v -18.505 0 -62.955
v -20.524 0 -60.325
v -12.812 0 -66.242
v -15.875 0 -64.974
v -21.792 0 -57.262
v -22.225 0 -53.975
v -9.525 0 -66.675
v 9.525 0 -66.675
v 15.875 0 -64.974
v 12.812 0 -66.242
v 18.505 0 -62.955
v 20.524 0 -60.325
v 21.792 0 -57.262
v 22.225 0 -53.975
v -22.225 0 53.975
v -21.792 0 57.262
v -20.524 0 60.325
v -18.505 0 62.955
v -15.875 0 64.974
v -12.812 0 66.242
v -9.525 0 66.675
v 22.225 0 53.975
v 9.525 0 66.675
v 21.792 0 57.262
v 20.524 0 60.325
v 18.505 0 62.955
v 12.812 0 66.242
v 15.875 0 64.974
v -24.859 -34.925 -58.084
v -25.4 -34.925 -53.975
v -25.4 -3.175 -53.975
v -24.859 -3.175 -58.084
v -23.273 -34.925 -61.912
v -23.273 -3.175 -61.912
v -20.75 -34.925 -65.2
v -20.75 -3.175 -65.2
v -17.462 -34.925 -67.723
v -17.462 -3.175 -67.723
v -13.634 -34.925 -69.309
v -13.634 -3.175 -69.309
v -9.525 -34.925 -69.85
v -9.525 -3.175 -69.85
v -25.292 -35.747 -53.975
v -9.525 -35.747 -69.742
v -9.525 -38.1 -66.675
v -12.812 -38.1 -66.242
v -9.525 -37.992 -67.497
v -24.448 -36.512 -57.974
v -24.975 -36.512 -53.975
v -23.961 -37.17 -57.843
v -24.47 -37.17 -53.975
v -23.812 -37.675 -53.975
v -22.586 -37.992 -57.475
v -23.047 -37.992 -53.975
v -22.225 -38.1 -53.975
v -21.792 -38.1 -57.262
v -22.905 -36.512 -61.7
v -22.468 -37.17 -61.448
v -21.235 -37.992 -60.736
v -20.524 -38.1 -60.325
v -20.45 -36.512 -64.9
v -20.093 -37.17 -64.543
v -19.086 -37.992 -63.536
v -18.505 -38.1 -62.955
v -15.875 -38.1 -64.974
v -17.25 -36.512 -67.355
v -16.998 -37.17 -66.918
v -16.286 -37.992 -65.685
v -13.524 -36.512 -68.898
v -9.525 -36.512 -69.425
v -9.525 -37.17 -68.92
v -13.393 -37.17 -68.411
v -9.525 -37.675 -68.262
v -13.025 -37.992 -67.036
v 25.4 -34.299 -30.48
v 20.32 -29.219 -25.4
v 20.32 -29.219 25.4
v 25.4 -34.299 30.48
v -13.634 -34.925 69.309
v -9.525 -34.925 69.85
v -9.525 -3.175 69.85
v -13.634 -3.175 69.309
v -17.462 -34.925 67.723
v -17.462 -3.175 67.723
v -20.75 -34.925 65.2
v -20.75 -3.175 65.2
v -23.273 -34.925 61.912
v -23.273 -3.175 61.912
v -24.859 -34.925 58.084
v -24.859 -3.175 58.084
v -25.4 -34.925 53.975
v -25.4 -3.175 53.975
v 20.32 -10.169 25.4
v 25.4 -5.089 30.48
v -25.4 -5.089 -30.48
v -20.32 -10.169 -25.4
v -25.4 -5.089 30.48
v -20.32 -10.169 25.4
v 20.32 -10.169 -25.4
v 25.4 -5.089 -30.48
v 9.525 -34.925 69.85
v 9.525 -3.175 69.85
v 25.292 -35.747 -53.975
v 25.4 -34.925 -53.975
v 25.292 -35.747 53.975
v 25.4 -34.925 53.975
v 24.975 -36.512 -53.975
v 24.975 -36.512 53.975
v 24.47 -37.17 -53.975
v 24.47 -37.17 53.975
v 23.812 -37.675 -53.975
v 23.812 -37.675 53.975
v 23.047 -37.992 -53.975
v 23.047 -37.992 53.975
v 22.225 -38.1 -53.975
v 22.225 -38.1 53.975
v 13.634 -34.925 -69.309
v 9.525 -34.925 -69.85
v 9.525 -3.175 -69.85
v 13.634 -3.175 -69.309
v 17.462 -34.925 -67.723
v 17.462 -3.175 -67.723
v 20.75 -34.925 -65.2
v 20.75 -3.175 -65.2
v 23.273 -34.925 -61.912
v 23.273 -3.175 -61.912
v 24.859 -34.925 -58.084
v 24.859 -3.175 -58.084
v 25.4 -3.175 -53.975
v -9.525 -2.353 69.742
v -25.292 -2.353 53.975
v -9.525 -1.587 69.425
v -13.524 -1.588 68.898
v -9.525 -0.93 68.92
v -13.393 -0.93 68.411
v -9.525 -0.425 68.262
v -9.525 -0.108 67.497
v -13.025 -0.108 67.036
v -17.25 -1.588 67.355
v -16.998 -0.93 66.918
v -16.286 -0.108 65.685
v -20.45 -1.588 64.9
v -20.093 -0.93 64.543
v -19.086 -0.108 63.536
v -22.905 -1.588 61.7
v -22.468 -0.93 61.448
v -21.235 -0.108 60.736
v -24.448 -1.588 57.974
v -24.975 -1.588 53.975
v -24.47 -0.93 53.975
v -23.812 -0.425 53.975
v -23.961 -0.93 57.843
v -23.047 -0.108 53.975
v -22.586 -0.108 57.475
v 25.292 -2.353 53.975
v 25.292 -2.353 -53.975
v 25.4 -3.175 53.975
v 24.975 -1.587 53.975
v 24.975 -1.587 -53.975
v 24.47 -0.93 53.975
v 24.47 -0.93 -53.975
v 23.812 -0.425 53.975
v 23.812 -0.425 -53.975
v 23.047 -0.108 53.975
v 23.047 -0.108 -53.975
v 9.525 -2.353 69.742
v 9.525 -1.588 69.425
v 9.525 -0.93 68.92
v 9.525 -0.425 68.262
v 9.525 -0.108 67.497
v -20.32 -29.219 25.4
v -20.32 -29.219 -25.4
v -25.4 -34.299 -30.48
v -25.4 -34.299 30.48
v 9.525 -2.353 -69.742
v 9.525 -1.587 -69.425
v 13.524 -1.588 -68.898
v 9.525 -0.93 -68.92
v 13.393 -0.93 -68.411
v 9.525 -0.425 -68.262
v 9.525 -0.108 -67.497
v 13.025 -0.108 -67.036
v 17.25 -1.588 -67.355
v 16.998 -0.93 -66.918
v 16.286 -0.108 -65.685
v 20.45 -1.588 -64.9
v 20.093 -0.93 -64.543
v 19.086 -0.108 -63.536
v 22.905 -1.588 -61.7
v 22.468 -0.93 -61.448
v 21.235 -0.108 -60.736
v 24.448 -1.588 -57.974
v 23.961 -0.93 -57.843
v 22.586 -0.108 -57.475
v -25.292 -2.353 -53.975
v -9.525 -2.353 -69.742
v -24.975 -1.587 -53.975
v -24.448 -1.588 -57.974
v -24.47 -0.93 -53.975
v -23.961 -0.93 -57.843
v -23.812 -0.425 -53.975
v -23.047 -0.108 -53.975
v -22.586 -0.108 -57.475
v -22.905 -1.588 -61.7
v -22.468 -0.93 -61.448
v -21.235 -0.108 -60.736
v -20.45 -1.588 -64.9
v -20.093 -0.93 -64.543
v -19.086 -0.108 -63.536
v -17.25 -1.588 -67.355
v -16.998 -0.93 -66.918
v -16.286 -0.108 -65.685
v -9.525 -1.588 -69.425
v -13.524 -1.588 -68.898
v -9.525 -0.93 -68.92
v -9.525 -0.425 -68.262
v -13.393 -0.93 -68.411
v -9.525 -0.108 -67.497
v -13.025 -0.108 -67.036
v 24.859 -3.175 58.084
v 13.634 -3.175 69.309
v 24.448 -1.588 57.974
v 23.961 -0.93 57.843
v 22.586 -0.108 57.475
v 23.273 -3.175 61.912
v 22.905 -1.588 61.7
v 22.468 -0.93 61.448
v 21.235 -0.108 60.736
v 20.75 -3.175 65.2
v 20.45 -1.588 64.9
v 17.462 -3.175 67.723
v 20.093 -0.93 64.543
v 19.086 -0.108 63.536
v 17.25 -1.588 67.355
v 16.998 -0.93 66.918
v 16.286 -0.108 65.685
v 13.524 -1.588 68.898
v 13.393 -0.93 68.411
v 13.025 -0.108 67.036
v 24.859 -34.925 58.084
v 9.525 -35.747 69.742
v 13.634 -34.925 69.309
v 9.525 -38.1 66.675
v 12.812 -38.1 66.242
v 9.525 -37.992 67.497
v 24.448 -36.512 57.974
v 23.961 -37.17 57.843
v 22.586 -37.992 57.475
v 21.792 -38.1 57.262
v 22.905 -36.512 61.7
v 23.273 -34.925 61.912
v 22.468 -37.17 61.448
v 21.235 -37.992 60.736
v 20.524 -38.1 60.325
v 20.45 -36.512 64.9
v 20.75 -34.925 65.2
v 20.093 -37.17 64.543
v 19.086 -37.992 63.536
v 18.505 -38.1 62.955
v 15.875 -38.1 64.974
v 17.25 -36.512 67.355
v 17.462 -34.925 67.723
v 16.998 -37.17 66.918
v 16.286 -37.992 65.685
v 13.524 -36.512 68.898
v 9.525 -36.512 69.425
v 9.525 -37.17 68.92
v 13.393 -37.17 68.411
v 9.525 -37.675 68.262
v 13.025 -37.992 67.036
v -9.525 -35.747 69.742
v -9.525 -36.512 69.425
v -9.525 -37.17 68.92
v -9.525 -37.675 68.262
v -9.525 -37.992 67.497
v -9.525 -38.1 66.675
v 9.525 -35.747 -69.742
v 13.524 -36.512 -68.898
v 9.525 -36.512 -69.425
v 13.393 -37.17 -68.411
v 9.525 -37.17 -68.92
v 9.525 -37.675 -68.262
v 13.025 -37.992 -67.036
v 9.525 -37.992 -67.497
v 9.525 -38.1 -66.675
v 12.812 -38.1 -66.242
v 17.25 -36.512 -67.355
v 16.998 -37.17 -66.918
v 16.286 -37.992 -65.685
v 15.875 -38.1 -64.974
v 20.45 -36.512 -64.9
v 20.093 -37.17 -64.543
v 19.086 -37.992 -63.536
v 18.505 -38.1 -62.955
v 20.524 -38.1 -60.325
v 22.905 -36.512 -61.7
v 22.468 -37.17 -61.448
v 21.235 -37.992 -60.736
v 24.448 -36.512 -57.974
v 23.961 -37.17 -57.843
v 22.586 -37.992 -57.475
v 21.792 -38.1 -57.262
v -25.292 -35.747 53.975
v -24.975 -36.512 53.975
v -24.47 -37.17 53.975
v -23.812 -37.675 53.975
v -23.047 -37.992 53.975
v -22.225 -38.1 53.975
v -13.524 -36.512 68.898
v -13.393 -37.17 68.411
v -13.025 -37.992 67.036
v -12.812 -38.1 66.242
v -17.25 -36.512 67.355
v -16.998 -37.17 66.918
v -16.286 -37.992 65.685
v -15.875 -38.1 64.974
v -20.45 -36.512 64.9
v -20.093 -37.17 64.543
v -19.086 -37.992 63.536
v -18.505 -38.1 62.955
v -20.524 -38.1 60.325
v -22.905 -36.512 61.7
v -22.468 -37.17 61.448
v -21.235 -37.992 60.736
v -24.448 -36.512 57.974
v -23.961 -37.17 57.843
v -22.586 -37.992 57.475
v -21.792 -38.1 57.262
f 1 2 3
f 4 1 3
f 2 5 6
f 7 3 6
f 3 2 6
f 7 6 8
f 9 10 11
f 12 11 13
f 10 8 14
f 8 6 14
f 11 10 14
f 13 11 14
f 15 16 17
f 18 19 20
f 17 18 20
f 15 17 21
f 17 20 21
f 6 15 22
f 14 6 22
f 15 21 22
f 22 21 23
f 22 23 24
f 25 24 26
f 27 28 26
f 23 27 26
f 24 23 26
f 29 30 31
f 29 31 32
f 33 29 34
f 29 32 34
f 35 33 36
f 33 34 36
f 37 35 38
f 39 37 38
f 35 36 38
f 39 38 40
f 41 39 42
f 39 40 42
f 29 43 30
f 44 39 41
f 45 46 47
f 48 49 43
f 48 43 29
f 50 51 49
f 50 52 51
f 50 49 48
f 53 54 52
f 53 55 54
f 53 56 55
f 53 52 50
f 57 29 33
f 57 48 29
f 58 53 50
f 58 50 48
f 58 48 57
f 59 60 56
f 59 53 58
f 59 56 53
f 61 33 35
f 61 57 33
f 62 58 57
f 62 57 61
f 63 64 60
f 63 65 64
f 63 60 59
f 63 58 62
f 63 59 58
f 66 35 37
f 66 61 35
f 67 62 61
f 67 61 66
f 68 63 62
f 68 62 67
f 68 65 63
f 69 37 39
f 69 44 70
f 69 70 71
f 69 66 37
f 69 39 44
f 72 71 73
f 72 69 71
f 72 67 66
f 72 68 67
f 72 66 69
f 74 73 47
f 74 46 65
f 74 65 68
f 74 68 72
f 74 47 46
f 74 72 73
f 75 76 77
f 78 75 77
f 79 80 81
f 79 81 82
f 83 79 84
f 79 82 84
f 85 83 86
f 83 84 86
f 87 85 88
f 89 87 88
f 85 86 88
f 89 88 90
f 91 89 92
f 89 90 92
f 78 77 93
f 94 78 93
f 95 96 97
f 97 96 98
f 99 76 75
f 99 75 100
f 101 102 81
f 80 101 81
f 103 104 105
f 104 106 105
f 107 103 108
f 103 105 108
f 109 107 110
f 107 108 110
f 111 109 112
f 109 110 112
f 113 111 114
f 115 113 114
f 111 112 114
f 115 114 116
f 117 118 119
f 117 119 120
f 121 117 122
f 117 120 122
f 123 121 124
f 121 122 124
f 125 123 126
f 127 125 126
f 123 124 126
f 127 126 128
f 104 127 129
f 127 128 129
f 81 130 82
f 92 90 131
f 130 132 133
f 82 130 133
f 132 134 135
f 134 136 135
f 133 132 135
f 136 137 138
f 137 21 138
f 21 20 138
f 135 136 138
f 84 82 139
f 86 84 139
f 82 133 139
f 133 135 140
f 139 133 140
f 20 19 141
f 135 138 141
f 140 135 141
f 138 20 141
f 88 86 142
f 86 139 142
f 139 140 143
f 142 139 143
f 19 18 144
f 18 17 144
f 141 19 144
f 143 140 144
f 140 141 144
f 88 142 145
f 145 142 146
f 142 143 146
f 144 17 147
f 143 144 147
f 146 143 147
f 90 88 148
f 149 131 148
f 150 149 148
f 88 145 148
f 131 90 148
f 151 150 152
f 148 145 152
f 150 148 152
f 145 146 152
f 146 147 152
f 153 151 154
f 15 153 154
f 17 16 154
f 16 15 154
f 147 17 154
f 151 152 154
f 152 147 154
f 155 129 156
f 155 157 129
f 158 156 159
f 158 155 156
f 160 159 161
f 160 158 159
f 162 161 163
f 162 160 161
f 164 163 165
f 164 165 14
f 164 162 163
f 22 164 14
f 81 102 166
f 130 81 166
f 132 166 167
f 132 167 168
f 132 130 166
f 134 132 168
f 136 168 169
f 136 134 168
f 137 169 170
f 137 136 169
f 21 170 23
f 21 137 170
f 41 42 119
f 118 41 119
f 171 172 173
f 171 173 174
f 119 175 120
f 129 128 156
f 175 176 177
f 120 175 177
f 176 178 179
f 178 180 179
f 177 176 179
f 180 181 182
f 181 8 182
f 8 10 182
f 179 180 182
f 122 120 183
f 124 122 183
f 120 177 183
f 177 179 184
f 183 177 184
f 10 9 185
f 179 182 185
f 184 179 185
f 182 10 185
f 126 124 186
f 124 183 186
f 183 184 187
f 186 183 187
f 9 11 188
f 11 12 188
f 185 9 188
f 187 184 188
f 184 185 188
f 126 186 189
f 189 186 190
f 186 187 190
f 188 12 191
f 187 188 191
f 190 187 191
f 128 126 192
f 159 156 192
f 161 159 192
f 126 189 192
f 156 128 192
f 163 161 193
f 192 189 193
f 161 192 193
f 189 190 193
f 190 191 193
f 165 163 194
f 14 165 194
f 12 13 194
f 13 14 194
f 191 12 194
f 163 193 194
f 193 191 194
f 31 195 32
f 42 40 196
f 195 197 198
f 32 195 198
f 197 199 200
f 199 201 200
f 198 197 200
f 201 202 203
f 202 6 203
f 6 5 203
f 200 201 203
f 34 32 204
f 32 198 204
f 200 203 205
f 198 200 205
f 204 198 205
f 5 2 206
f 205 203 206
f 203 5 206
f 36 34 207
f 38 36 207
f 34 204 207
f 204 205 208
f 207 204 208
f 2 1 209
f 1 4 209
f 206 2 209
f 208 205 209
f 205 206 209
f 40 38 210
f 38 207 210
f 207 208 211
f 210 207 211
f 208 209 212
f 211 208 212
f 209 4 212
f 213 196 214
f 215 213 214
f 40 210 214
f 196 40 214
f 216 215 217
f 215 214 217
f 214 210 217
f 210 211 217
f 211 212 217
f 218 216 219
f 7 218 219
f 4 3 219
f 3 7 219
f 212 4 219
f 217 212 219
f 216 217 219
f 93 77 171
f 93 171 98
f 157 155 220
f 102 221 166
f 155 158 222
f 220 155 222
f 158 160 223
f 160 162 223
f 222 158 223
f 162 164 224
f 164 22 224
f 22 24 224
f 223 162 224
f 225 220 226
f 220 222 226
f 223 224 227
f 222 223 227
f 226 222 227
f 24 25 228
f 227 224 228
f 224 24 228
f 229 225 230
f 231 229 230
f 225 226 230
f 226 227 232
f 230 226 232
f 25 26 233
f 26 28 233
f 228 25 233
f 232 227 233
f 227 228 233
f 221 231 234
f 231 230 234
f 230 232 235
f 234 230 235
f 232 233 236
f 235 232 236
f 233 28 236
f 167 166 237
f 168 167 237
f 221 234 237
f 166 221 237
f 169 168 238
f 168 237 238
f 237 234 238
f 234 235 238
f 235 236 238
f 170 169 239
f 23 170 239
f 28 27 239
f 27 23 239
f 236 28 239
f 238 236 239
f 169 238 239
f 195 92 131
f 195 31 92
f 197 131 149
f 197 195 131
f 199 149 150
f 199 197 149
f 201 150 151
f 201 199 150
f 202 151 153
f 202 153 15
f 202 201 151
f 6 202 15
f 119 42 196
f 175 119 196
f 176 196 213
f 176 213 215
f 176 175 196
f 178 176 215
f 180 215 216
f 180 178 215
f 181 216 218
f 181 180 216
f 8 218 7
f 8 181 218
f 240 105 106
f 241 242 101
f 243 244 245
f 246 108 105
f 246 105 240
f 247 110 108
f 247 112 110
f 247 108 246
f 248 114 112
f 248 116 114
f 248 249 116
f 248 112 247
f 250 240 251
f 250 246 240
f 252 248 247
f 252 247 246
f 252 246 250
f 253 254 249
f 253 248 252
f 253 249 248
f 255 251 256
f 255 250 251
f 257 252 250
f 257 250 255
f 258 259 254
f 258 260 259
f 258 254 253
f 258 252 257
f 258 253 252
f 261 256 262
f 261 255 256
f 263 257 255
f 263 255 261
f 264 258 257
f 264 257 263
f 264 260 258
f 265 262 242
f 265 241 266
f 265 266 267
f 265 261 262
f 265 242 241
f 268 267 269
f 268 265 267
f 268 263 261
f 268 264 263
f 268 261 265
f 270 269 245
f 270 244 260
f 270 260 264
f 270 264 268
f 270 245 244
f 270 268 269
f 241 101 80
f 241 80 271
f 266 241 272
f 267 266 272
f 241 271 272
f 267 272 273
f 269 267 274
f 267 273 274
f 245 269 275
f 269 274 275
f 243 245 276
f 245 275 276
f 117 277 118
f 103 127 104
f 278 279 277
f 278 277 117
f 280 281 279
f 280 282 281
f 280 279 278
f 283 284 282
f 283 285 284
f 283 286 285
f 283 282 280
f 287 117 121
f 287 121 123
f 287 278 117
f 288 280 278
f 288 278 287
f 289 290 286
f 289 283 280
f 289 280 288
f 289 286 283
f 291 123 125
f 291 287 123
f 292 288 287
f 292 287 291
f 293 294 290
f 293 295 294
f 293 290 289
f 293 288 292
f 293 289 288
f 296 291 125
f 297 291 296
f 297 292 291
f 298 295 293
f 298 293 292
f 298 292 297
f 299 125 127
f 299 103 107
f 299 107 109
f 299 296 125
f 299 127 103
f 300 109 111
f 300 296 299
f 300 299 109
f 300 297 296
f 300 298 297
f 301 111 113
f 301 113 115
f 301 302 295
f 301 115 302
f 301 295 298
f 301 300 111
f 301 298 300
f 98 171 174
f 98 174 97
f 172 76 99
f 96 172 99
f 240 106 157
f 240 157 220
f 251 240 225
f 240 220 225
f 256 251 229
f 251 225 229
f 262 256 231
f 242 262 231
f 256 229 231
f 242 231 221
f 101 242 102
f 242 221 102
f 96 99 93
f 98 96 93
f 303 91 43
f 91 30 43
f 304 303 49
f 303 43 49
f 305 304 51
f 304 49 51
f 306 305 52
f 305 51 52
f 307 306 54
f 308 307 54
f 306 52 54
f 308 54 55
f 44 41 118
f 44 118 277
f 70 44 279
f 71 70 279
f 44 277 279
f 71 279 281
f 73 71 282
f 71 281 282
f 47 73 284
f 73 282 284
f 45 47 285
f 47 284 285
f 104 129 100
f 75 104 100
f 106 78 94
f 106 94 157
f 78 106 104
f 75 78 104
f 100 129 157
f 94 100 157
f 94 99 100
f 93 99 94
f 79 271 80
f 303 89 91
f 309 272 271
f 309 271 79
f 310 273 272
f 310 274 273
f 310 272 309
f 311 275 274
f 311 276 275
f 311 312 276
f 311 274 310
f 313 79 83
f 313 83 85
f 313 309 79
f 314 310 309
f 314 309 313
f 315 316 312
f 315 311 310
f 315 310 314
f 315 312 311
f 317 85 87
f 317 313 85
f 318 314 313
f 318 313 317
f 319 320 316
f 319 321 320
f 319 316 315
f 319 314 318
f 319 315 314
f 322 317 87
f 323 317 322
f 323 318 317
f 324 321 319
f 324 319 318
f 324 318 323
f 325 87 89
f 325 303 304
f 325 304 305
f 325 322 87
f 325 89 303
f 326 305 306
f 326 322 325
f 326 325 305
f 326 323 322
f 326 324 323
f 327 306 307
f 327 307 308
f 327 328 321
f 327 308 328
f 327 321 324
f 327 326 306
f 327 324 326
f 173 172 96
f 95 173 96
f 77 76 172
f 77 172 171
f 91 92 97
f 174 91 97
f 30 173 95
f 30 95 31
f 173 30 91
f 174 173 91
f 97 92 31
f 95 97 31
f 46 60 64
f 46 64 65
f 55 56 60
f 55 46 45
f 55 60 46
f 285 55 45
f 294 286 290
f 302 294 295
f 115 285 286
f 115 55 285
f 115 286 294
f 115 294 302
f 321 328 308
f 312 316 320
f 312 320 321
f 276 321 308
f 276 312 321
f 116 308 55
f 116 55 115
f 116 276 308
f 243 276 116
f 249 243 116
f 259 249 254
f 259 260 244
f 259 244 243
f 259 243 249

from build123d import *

# Parameters (mm, degrees)
F1_DEPTH = 38.1
F2_R     = 3.175
F3_W     = 19.05
F3_H     = 50.8
F4_DEPTH = 50.801
F5_SIZE  = 5.08


with BuildPart() as f1:
    # F0 (on Front) → F1 (new body)
    with BuildSketch(Plane.XZ):
        with BuildLine():
            Line((9.525, 69.85), (-9.525, 69.85))
            ThreePointArc((-9.525, 69.85), (-20.7503201513, 65.2003201513), (-25.4, 53.975))
            Line((-25.4, 53.975), (-25.4, -53.975))
            ThreePointArc((-25.4, -53.975), (-20.7503201513, -65.2003201513), (-9.525, -69.85))
            Line((-9.525, -69.85), (9.525, -69.85))
            ThreePointArc((9.525, -69.85), (20.7503201513, -65.2003201513), (25.4, -53.975))
            Line((25.4, -53.975), (25.4, 53.975))
            ThreePointArc((25.4, 53.975), (20.7503201513, 65.2003201513), (9.525, 69.85))
        make_face()
    extrude(amount=F1_DEPTH)

    # F2
    f2_edges = [f1.edges().sort_by_distance(p)[0] for p in [
        (25.4, -38.1, 0),
        (25.4, 0, 0),
    ]]
    fillet(f2_edges, radius=F2_R)

    # F3 (on face) → F4 (cut, through all)
    with BuildSketch(Plane.YZ.offset(25.4)):
        with Locations((-19.6936223656, 0)):
            Rectangle(F3_W, F3_H)
    extrude(amount=-F4_DEPTH, mode=Mode.SUBTRACT)

    # F5
    f5_edges = [f1.edges().sort_by_distance(p)[0] for p in [
        (-25.4, -19.05, 53.975),
        (-25.4, -3.175, 0),
        (-25.4, -34.925, 0),
        (-25.4, -19.05, -53.975),
        (-25.4, -19.693622, -25.4),
        (-25.4, -10.168622, 0),
        (-25.4, -19.693622, 25.4),
        (-25.4, -29.218622, 0),
        (25.4, -19.05, -53.975),
        (25.4, -3.175, 0),
        (25.4, -34.925, 0),
        (25.4, -19.05, 53.975),
        (25.4, -29.218622, 0),
        (25.4, -19.693622, 25.4),
        (25.4, -10.168622, 0),
        (25.4, -19.693622, -25.4),
    ]]
    chamfer(f5_edges, length=F5_SIZE)


solid = f1.part
